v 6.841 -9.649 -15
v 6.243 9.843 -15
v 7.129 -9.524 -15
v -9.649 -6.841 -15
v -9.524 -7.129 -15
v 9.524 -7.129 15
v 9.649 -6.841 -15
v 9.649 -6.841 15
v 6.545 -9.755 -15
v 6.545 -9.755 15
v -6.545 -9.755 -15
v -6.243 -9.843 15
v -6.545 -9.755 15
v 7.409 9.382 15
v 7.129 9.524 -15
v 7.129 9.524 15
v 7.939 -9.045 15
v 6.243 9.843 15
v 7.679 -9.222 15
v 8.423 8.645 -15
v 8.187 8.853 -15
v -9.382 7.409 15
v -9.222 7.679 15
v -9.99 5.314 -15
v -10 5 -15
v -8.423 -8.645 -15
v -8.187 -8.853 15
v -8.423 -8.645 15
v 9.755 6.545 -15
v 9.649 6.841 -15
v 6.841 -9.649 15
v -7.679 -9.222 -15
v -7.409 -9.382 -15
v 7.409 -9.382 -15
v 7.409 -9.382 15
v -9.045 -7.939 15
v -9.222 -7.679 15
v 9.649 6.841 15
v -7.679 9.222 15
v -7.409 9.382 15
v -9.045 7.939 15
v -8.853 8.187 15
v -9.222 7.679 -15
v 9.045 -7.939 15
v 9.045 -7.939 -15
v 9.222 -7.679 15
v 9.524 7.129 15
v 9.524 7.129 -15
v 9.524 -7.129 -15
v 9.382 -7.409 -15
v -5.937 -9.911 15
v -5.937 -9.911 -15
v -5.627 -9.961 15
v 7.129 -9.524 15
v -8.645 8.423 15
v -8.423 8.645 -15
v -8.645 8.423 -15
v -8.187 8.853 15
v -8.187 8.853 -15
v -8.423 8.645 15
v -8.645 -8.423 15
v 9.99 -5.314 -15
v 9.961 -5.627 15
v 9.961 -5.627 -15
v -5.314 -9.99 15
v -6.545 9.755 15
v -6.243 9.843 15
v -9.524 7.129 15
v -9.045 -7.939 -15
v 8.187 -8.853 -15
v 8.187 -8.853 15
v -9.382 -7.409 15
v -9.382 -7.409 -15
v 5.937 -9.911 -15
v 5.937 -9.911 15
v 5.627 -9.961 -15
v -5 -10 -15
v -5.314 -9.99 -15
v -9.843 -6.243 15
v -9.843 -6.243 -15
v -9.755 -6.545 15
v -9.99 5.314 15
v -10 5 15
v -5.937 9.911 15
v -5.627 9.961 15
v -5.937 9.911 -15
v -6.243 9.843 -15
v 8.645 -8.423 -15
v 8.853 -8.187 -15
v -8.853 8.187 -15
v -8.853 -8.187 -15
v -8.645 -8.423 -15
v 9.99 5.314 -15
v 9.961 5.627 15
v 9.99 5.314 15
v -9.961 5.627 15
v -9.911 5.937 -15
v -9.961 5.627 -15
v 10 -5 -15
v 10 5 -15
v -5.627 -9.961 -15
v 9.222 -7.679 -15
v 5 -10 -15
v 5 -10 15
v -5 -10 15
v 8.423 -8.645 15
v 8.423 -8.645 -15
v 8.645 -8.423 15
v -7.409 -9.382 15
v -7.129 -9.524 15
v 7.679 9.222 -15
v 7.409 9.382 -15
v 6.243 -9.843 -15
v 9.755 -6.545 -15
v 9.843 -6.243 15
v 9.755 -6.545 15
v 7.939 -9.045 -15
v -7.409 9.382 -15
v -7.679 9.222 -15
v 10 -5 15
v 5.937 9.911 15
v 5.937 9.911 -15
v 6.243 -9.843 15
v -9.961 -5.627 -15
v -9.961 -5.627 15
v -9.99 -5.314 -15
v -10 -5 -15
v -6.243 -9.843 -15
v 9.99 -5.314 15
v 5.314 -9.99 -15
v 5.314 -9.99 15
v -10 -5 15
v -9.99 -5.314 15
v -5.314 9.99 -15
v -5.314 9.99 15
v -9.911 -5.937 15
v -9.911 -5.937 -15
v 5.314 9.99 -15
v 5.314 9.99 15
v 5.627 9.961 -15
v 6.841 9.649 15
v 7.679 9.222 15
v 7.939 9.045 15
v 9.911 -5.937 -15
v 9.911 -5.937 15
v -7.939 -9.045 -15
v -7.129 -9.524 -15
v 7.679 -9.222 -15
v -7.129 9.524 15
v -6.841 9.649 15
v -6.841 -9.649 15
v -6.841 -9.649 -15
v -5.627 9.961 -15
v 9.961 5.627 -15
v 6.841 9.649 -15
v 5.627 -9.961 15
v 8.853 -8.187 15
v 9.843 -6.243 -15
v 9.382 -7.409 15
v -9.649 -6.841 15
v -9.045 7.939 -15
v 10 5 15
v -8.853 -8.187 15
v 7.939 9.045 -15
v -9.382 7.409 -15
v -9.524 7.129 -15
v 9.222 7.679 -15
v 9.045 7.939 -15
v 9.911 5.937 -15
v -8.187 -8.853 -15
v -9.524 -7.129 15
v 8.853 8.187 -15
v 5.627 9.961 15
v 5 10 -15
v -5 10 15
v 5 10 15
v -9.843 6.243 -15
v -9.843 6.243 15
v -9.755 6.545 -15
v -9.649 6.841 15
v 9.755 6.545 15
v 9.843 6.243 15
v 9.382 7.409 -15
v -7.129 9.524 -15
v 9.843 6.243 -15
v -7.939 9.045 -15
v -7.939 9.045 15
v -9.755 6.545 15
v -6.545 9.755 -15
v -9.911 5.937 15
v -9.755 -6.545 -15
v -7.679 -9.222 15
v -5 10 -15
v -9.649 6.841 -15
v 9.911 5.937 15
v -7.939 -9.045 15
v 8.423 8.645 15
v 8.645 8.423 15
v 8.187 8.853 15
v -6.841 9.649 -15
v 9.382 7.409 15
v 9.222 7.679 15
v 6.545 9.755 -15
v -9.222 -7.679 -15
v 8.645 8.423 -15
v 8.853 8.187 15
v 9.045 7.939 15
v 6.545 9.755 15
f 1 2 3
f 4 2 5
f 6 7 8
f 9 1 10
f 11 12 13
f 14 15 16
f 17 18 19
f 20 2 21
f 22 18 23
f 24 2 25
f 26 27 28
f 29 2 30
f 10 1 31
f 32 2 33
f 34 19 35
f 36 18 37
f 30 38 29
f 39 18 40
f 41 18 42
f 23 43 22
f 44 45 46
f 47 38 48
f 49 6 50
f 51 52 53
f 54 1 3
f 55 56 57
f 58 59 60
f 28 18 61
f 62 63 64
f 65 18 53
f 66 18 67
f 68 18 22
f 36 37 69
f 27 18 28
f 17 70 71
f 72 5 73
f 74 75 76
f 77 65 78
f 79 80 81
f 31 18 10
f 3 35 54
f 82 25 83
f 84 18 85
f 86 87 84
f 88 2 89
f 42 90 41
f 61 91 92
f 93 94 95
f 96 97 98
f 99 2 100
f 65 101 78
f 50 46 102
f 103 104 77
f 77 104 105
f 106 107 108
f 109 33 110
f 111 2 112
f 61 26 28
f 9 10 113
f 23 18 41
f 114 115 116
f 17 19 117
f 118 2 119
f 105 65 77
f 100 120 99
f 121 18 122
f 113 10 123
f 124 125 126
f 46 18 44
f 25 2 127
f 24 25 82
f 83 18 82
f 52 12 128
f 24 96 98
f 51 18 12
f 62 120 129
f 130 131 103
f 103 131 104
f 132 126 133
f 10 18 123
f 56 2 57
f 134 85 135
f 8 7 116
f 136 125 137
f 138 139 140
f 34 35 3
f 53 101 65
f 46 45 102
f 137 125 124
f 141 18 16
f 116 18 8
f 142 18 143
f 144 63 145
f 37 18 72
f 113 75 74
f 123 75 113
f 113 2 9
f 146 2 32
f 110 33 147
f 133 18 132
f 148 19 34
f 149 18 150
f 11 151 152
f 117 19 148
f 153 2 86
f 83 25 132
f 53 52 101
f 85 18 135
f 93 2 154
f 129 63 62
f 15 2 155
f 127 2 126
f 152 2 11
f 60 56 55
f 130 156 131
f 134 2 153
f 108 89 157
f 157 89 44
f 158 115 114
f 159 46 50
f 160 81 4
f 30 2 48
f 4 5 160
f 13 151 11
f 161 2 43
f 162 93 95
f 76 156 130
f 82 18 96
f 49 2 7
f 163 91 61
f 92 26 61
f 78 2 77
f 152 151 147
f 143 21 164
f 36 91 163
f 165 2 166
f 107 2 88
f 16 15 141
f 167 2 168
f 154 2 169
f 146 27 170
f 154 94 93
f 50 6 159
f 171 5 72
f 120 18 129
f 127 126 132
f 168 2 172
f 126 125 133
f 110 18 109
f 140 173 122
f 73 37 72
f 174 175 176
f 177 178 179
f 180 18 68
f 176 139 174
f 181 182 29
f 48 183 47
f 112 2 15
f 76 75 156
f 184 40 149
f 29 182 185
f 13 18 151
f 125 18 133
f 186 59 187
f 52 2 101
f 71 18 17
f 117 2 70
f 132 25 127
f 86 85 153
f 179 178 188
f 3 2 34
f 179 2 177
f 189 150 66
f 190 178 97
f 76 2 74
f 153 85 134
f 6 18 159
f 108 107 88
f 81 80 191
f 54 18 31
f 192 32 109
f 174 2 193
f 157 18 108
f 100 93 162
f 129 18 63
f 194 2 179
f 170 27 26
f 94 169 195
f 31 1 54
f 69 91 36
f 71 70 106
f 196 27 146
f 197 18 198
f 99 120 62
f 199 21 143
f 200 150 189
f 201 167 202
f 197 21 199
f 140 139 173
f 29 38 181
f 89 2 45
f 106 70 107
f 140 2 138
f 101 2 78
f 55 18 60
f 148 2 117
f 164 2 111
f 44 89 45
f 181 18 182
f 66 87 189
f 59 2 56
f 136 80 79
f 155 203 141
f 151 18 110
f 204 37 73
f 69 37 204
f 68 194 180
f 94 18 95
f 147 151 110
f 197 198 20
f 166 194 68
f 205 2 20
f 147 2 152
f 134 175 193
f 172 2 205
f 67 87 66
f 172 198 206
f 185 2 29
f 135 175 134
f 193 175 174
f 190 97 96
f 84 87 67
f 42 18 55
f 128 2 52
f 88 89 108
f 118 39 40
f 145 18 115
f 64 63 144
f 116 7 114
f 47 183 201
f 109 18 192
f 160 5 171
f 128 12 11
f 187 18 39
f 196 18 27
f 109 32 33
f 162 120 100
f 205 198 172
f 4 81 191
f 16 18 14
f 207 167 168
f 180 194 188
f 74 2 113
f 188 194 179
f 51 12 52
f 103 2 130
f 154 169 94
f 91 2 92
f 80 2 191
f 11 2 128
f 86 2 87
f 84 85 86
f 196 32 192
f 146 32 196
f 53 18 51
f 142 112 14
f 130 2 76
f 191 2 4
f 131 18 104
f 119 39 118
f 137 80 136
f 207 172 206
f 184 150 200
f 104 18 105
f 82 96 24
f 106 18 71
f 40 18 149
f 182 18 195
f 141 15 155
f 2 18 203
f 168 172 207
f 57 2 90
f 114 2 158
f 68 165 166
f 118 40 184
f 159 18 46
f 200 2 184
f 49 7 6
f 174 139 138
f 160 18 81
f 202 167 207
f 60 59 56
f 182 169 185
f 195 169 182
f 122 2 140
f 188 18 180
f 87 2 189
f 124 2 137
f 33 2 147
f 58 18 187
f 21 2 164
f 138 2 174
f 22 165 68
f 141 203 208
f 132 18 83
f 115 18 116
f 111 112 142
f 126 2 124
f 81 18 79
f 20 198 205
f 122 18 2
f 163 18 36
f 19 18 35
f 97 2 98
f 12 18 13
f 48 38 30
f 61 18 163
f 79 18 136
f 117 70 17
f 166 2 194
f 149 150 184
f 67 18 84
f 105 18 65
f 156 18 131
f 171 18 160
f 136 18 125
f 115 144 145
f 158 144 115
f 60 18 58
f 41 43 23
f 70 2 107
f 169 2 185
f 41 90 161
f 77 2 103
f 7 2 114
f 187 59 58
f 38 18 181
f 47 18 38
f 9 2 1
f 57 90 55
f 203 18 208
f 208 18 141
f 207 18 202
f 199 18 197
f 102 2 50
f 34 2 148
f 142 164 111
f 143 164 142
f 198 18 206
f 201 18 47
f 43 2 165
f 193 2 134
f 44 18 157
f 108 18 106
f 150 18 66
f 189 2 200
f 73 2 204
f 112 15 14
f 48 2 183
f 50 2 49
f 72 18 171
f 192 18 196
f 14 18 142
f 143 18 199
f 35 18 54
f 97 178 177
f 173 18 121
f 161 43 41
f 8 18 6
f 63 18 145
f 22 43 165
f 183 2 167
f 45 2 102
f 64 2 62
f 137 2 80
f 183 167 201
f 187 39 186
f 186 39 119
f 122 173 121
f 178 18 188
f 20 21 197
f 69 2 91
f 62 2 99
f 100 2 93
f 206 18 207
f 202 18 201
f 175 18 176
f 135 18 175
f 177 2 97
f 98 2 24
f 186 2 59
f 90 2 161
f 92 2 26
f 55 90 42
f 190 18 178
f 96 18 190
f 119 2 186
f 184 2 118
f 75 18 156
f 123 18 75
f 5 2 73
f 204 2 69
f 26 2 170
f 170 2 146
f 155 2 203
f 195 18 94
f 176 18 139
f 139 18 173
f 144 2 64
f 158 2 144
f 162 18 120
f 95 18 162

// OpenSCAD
$fn = 100;
minkowski() {
    cube([10, 10, 10], center = true);
    cylinder(h = 20, r1 = 5, r2 = 5, center = true);
}
